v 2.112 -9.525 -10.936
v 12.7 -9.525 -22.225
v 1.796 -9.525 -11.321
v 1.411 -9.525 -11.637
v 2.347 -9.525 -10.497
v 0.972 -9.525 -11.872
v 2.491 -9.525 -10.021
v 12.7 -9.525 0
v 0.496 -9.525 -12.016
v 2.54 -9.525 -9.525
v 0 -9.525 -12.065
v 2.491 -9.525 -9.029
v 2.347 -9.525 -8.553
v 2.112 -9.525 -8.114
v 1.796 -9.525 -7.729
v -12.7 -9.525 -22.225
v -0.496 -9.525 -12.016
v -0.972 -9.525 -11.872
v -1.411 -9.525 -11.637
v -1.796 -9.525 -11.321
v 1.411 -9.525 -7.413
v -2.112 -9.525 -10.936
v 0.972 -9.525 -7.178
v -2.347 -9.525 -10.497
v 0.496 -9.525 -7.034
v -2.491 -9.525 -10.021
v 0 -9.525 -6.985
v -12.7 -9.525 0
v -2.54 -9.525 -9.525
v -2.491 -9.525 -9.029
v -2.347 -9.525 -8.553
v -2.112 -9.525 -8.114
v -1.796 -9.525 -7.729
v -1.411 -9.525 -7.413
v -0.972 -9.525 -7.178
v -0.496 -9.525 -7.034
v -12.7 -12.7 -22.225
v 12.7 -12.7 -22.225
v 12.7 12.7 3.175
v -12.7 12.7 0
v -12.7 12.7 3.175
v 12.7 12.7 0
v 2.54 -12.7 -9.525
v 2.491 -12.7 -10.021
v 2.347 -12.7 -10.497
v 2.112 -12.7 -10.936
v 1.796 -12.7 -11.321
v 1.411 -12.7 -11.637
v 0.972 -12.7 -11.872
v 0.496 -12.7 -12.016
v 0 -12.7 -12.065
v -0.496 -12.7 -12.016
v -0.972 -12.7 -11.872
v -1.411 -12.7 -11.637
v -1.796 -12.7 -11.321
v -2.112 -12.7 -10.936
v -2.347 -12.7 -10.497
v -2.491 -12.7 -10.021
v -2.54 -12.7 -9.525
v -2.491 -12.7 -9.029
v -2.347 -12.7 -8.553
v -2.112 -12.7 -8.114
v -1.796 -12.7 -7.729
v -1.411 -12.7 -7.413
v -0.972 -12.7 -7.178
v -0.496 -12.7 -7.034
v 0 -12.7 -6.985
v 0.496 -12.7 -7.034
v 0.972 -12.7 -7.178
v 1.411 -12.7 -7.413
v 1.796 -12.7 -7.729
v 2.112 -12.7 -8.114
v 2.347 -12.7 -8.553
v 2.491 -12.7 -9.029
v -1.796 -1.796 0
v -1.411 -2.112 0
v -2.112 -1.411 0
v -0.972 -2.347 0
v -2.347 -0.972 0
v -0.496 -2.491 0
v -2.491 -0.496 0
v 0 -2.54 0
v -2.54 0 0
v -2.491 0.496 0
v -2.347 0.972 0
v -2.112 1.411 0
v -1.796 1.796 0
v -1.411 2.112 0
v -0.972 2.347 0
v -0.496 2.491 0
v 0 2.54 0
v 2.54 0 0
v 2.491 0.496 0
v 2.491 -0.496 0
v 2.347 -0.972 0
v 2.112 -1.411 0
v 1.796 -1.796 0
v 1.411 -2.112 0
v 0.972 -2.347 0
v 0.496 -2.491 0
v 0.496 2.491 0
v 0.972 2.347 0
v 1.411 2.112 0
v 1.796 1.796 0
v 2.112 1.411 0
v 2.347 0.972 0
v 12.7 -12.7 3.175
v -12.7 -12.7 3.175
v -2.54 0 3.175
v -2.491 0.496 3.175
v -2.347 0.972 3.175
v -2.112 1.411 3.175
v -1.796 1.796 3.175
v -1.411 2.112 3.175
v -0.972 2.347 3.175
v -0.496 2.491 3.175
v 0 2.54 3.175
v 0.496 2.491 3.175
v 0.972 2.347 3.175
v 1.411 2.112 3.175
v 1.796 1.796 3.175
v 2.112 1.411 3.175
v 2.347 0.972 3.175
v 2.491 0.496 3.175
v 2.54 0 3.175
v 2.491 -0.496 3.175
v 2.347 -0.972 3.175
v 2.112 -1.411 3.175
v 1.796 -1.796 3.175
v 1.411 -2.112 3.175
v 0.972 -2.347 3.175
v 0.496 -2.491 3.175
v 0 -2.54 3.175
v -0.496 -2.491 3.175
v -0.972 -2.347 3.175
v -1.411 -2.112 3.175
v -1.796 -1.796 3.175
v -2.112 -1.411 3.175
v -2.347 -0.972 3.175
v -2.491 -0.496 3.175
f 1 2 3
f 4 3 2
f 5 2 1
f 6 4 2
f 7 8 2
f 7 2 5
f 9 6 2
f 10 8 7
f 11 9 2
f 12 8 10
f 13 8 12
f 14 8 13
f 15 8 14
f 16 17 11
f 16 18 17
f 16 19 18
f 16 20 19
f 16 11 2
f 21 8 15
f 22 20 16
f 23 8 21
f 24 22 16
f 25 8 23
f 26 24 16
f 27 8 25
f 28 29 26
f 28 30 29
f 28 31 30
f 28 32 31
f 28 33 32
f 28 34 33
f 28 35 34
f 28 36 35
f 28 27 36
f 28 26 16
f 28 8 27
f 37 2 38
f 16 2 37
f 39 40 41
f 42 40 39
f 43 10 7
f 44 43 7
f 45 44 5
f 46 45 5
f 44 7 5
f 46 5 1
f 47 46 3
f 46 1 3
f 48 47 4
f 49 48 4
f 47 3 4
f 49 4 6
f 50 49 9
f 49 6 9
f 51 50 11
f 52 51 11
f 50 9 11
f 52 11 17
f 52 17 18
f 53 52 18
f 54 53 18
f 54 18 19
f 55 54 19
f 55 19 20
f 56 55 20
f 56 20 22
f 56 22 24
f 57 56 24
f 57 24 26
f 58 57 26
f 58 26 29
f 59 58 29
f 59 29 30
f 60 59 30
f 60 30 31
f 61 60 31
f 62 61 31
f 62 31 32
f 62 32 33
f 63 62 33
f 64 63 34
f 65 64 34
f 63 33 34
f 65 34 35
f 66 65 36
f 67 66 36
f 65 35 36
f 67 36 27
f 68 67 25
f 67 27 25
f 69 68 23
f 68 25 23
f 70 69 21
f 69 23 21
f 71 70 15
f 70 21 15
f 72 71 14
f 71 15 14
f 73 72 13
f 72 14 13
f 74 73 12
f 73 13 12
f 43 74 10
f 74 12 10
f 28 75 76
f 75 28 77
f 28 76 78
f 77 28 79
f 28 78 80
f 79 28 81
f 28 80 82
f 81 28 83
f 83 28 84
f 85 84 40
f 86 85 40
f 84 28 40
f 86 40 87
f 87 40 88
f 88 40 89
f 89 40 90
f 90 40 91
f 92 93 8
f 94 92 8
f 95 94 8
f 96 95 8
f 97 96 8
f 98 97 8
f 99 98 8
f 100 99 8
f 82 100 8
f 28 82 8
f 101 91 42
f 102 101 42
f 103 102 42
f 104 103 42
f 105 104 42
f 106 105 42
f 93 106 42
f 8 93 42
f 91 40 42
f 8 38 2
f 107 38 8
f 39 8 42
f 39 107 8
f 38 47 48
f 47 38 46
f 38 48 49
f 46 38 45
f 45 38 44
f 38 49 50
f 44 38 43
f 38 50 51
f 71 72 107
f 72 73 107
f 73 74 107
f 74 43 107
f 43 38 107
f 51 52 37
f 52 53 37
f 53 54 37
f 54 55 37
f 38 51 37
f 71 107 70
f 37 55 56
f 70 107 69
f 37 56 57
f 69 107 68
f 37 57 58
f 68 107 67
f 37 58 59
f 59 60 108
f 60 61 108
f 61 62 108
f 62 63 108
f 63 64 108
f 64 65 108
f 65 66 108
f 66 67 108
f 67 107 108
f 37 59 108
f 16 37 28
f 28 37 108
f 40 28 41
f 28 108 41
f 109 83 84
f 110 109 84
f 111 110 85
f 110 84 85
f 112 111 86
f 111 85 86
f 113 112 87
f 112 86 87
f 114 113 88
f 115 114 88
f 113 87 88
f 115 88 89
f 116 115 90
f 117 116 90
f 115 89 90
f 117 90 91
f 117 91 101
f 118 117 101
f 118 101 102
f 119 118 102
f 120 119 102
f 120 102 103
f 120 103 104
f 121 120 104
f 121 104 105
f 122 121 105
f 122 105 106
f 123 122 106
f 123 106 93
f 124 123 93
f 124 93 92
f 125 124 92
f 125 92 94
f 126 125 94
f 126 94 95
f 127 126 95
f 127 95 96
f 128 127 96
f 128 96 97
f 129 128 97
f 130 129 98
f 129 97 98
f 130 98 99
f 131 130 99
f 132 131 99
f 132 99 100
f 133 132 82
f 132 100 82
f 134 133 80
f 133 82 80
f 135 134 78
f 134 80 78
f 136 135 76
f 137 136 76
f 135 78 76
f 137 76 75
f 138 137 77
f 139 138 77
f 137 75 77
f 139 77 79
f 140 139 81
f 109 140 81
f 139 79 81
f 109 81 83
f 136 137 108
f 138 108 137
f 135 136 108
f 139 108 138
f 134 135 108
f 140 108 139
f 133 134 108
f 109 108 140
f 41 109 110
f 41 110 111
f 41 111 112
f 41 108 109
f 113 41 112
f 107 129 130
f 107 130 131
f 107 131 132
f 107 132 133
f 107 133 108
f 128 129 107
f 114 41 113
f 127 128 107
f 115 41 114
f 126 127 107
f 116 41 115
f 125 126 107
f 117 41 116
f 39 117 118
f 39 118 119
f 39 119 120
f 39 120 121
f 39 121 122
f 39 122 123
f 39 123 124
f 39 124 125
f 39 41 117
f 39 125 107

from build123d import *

# Parameters (mm, degrees)
SKETCH4_W           = 25.4
SKETCH4_H           = 25.4
BOSS_EXTRUDE3_DEPTH = 3.175
SKETCH5_W           = 25.4
SKETCH5_H           = 3.175
BOSS_EXTRUDE4_DEPTH = 22.225
SKETCH6_R           = 2.54
CUT_EXTRUDE1_DEPTH  = 4.175
SKETCH7_R           = 2.54
CUT_EXTRUDE2_DEPTH  = 4.175


with BuildPart() as part:
    # Sketch4 → Boss-Extrude3 (new body)
    with BuildSketch(Plane.XY):
        Rectangle(SKETCH4_W, SKETCH4_H)
    extrude(amount=BOSS_EXTRUDE3_DEPTH)

    # Sketch5 → Boss-Extrude4 (add)
    with BuildSketch(Plane(origin=(0, 0, 0), x_dir=(-1, 0, 0), z_dir=(0, 0, -1))):
        with Locations((0, -11.1125)):
            Rectangle(SKETCH5_W, SKETCH5_H)
    extrude(amount=BOSS_EXTRUDE4_DEPTH)

    # Sketch6 → Cut-Extrude1 (cut, through all)
    with BuildSketch(Plane(origin=(0, -9.525, 0), x_dir=(1, 0, 0), z_dir=(0, 1, 0))):
        with Locations((0, 9.525)):
            Circle(SKETCH6_R)
    extrude(amount=-CUT_EXTRUDE1_DEPTH, mode=Mode.SUBTRACT)

    # Sketch7 → Cut-Extrude2 (cut, through all)
    with BuildSketch(Plane(origin=(0, 0, 0), x_dir=(-1, 0, 0), z_dir=(0, 0, -1))):
        Circle(SKETCH7_R)
    extrude(amount=-CUT_EXTRUDE2_DEPTH, mode=Mode.SUBTRACT)


solid = part.part
